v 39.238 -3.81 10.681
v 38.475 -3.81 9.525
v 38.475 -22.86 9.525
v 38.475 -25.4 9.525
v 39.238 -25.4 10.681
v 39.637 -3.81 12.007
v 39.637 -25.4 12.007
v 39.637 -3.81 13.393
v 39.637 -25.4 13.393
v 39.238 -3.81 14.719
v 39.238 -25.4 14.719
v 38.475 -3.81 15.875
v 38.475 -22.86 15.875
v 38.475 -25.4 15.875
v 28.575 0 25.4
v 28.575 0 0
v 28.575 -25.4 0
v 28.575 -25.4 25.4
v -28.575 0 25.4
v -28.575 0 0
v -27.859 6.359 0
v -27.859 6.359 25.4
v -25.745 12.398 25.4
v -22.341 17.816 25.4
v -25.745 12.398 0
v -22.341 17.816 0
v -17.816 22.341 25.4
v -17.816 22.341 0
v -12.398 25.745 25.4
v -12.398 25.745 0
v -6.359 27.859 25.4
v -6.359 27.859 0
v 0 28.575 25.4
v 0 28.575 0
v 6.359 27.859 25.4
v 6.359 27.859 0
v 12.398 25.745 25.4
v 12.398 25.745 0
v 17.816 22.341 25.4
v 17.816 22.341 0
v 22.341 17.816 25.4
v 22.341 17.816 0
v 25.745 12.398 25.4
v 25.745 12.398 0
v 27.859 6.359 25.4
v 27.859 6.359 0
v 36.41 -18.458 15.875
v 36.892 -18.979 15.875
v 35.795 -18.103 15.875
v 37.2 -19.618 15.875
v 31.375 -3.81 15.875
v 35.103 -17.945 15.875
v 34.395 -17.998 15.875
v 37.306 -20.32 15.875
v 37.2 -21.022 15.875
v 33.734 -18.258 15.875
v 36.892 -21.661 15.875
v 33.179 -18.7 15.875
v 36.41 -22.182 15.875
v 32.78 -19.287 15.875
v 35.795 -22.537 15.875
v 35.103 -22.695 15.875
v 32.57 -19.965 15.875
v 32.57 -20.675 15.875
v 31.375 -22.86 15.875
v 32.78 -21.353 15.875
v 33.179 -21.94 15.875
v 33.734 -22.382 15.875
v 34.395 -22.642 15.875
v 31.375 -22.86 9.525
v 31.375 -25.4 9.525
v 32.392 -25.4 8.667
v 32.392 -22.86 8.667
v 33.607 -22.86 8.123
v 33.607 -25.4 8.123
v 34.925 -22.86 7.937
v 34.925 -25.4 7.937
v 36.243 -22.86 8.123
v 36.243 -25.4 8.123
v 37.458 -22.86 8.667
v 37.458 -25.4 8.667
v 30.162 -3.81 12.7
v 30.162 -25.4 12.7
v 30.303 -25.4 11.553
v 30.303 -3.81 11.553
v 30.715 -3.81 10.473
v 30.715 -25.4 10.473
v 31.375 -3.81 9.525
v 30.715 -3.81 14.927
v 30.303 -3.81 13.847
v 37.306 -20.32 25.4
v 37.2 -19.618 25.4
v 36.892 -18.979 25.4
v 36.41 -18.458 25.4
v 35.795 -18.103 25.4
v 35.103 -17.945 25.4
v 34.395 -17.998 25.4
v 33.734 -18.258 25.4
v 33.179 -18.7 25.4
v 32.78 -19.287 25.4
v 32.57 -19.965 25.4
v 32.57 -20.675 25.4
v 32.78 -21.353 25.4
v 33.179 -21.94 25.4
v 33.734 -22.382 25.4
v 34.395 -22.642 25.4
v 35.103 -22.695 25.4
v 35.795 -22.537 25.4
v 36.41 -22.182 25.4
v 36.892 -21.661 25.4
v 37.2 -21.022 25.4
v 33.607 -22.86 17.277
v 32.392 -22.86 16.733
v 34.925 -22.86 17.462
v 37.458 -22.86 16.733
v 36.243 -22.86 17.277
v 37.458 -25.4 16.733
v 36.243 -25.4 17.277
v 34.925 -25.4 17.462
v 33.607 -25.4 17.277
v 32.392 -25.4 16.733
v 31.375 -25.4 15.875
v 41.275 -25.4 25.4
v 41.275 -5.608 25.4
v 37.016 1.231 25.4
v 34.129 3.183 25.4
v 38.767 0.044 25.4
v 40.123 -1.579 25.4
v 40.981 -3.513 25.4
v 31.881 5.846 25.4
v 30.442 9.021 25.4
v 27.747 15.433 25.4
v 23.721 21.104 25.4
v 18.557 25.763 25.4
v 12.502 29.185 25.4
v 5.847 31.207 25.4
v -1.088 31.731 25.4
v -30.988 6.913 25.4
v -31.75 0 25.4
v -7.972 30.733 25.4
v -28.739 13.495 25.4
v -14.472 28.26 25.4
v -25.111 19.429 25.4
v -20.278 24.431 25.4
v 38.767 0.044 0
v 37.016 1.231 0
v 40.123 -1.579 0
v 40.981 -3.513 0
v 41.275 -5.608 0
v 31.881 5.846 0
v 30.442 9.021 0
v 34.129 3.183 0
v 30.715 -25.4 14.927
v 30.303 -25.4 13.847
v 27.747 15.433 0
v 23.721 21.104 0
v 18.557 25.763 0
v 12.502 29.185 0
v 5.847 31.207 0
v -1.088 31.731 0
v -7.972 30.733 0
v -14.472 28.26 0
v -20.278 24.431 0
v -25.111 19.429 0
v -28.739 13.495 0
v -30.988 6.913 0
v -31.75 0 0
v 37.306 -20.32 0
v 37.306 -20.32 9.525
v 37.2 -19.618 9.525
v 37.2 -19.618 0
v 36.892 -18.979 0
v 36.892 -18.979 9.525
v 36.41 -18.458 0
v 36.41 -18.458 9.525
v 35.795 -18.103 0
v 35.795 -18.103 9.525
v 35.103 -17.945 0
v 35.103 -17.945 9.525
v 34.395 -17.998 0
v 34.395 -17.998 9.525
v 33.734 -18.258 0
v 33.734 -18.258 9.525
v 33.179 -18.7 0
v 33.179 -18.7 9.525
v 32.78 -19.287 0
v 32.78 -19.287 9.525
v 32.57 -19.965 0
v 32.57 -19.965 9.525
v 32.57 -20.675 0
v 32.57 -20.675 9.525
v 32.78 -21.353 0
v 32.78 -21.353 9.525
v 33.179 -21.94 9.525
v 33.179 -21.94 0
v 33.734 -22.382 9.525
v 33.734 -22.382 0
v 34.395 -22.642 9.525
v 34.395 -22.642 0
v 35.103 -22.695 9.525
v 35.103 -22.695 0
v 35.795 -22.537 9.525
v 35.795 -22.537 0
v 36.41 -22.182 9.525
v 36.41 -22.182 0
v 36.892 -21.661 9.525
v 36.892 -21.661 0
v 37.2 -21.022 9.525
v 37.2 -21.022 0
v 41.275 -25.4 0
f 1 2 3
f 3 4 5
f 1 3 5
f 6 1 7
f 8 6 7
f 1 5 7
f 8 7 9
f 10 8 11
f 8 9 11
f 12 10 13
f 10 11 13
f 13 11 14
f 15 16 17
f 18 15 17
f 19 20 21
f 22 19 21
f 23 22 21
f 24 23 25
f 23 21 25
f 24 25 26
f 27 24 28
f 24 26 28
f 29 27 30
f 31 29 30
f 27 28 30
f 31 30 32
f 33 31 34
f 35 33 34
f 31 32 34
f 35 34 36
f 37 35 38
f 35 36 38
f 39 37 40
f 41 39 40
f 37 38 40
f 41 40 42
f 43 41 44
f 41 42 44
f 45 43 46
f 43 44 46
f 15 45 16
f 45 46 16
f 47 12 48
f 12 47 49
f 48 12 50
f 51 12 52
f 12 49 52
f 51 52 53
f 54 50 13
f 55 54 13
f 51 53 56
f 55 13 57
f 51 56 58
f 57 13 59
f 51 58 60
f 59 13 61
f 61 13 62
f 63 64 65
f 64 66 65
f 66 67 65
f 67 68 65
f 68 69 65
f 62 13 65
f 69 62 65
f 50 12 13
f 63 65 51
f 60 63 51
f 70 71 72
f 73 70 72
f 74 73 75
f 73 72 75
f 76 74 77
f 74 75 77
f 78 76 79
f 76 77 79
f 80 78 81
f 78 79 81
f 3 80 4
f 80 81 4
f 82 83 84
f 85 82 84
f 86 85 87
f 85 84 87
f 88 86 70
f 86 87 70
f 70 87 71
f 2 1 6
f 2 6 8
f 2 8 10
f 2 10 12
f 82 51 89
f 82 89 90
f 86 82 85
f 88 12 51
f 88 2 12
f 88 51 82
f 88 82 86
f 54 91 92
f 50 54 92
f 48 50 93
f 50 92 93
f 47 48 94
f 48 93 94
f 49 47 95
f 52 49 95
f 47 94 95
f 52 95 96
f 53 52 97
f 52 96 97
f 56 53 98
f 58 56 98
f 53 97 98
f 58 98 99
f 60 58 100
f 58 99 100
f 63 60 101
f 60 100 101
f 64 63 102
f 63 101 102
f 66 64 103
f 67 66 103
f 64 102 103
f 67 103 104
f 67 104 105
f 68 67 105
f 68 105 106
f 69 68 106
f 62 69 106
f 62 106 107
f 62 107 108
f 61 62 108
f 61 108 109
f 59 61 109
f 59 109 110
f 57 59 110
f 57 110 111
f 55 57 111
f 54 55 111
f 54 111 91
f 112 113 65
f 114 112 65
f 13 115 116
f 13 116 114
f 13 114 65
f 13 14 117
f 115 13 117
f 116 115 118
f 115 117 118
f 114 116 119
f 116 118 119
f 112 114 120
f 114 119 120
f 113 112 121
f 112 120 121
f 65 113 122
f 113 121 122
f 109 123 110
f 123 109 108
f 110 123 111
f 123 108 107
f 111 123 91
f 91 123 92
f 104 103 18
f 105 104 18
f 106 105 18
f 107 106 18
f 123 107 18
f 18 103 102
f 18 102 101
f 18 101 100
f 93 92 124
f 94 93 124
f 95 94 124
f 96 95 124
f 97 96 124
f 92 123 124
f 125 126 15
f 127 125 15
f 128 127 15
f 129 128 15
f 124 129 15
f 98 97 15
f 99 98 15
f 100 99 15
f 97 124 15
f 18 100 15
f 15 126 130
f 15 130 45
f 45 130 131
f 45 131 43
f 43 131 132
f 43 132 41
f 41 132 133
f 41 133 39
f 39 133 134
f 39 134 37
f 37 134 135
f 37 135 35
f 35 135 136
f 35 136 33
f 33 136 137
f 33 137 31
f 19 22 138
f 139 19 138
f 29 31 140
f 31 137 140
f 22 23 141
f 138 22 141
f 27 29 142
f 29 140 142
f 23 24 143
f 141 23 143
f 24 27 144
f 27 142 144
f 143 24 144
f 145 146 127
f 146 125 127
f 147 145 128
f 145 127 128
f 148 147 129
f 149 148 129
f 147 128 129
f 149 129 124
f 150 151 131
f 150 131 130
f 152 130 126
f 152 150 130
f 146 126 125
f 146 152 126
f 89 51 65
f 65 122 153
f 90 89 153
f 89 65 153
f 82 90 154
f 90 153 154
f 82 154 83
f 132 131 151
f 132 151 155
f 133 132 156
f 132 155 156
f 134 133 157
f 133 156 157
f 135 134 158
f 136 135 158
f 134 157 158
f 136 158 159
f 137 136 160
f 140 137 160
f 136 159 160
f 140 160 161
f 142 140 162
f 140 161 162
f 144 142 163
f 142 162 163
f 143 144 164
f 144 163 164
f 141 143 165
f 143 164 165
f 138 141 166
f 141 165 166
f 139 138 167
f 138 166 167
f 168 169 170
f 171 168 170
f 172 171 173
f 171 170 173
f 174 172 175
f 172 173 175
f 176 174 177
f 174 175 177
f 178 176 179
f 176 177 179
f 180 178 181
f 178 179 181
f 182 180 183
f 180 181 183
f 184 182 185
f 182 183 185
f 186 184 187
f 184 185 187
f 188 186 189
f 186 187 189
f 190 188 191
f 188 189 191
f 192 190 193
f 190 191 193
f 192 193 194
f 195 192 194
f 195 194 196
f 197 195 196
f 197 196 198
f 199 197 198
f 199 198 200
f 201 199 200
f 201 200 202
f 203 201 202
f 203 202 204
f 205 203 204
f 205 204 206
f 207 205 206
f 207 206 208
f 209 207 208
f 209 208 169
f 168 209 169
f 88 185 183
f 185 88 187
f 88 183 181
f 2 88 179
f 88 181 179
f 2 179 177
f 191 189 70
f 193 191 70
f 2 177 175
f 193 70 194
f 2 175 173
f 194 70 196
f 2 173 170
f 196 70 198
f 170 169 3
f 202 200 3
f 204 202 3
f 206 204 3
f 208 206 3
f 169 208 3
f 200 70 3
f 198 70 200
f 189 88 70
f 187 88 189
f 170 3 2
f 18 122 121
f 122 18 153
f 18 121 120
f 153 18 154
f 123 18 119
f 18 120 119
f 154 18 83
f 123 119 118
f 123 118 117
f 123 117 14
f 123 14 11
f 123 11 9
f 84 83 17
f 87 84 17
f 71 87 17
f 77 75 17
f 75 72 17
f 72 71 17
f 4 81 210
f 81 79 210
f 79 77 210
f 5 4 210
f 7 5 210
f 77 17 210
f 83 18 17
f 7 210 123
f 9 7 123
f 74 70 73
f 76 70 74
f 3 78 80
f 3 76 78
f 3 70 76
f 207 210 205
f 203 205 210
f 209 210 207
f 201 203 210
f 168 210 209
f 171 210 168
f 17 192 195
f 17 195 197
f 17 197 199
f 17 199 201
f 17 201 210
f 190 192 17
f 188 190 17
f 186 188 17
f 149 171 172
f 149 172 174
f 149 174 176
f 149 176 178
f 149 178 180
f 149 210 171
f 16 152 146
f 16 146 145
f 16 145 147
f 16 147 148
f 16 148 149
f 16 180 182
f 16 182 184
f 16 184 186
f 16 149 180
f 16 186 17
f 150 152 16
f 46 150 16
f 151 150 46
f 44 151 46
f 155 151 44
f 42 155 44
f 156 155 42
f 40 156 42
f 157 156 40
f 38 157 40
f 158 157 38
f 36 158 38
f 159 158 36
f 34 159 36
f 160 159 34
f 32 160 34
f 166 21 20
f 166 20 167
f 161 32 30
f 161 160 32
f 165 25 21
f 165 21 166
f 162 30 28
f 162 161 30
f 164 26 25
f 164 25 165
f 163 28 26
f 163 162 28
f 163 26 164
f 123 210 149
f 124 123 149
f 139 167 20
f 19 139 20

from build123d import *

# Parameters (mm, degrees)
BOSS_EXTRUDE1_DEPTH = 25.4
FILLET1_R           = 12.7
FILLET2_R           = 7.62
CUT_EXTRUDE1_DEPTH  = 21.59
SKETCH3_R           = 4.7625
CUT_EXTRUDE2_DEPTH  = 2.54
SKETCH4_R           = 2.38125
CUT_EXTRUDE3_DEPTH  = 58.938313101


with BuildPart() as part:
    # Sketch1 → Boss-Extrude1 (new body)
    with BuildSketch(Plane.XY):
        with BuildLine():
            ThreePointArc((-28.575, 0), (0, 28.575), (28.575, 0))
            Line((28.575, 0), (28.575, -25.4))
            Line((28.575, -25.4), (41.275, -25.4))
            Line((41.275, -25.4), (41.275, 0))
            Line((41.275, 0), (31.75, 0))
            ThreePointArc((31.75, 0), (0, 31.75), (-31.75, 0))
            Line((-31.75, 0), (-28.575, 0))
        make_face()
    extrude(amount=BOSS_EXTRUDE1_DEPTH)

    # Fillet1
    # the kernel refuses this fillet: 12.7 mm, written as the material it adds along each edge
    with BuildSketch(Plane(origin=(31.75, 0, 0), x_dir=(1, 0, 0), z_dir=(0, 0, 1))) as fillet1_piece_1:
        with BuildLine():
            CenterArc((10.868269231, 12.628761926), FILLET1_R, 196.505753727, 67.422759238)
            Line((-1.308379121, 9.020544233), (-1.551912088, 8.948379879))
            ThreePointArc((-1.551912088, 8.948379879), (-0.580166885, 4.521008688), (-0.254, 0))
            Line((-0.254, 0), (0, -0.254))
            ThreePointArc((0, -0.254), (4.7625, -0.254), (9.498134615, -0.252575239))
            Line((9.498134615, -0.252575239), (9.525, 0))
        make_face()
    extrude(amount=25.4)

    # Fillet2
    fillet2_edges = [part.edges().sort_by_distance(p)[0] for p in [
        (41.275, 0, 12.7),
    ]]
    fillet(fillet2_edges, radius=FILLET2_R)

    # Sketch2 → Cut-Extrude1 (cut)
    with BuildSketch(Plane(origin=(0, -25.4, 0), x_dir=(-1, 0, 0), z_dir=(0, -1, 0))):
        with BuildLine():
            ThreePointArc((-38.474757914, -9.525), (-39.6875, -12.7), (-38.474757914, -15.875))
            Line((-38.474757914, -15.875), (-31.375242086, -15.875))
            ThreePointArc((-31.375242086, -15.875), (-30.47600414, -14.399365203), (-30.1625, -12.7))
            ThreePointArc((-30.1625, -12.7), (-30.47600414, -11.000634797), (-31.375242086, -9.525))
            Line((-31.375242086, -9.525), (-38.474757914, -9.525))
        make_face()
    extrude(amount=-CUT_EXTRUDE1_DEPTH, mode=Mode.SUBTRACT)

    # Sketch3 → Cut-Extrude2 (cut)
    with BuildSketch(Plane.XZ.offset(25.4)):
        with Locations(Location((34.925, 12.7, 0), (0, 0, 270))):
            Circle(SKETCH3_R)
    extrude(amount=-CUT_EXTRUDE2_DEPTH, mode=Mode.SUBTRACT)

    # Sketch4 → Cut-Extrude3 (cut, through all)
    with BuildSketch(Plane.XY.offset(25.4)):
        with Locations((34.925, -20.32)):
            Circle(SKETCH4_R)
    extrude(amount=-CUT_EXTRUDE3_DEPTH, mode=Mode.SUBTRACT)


solid = part.part
